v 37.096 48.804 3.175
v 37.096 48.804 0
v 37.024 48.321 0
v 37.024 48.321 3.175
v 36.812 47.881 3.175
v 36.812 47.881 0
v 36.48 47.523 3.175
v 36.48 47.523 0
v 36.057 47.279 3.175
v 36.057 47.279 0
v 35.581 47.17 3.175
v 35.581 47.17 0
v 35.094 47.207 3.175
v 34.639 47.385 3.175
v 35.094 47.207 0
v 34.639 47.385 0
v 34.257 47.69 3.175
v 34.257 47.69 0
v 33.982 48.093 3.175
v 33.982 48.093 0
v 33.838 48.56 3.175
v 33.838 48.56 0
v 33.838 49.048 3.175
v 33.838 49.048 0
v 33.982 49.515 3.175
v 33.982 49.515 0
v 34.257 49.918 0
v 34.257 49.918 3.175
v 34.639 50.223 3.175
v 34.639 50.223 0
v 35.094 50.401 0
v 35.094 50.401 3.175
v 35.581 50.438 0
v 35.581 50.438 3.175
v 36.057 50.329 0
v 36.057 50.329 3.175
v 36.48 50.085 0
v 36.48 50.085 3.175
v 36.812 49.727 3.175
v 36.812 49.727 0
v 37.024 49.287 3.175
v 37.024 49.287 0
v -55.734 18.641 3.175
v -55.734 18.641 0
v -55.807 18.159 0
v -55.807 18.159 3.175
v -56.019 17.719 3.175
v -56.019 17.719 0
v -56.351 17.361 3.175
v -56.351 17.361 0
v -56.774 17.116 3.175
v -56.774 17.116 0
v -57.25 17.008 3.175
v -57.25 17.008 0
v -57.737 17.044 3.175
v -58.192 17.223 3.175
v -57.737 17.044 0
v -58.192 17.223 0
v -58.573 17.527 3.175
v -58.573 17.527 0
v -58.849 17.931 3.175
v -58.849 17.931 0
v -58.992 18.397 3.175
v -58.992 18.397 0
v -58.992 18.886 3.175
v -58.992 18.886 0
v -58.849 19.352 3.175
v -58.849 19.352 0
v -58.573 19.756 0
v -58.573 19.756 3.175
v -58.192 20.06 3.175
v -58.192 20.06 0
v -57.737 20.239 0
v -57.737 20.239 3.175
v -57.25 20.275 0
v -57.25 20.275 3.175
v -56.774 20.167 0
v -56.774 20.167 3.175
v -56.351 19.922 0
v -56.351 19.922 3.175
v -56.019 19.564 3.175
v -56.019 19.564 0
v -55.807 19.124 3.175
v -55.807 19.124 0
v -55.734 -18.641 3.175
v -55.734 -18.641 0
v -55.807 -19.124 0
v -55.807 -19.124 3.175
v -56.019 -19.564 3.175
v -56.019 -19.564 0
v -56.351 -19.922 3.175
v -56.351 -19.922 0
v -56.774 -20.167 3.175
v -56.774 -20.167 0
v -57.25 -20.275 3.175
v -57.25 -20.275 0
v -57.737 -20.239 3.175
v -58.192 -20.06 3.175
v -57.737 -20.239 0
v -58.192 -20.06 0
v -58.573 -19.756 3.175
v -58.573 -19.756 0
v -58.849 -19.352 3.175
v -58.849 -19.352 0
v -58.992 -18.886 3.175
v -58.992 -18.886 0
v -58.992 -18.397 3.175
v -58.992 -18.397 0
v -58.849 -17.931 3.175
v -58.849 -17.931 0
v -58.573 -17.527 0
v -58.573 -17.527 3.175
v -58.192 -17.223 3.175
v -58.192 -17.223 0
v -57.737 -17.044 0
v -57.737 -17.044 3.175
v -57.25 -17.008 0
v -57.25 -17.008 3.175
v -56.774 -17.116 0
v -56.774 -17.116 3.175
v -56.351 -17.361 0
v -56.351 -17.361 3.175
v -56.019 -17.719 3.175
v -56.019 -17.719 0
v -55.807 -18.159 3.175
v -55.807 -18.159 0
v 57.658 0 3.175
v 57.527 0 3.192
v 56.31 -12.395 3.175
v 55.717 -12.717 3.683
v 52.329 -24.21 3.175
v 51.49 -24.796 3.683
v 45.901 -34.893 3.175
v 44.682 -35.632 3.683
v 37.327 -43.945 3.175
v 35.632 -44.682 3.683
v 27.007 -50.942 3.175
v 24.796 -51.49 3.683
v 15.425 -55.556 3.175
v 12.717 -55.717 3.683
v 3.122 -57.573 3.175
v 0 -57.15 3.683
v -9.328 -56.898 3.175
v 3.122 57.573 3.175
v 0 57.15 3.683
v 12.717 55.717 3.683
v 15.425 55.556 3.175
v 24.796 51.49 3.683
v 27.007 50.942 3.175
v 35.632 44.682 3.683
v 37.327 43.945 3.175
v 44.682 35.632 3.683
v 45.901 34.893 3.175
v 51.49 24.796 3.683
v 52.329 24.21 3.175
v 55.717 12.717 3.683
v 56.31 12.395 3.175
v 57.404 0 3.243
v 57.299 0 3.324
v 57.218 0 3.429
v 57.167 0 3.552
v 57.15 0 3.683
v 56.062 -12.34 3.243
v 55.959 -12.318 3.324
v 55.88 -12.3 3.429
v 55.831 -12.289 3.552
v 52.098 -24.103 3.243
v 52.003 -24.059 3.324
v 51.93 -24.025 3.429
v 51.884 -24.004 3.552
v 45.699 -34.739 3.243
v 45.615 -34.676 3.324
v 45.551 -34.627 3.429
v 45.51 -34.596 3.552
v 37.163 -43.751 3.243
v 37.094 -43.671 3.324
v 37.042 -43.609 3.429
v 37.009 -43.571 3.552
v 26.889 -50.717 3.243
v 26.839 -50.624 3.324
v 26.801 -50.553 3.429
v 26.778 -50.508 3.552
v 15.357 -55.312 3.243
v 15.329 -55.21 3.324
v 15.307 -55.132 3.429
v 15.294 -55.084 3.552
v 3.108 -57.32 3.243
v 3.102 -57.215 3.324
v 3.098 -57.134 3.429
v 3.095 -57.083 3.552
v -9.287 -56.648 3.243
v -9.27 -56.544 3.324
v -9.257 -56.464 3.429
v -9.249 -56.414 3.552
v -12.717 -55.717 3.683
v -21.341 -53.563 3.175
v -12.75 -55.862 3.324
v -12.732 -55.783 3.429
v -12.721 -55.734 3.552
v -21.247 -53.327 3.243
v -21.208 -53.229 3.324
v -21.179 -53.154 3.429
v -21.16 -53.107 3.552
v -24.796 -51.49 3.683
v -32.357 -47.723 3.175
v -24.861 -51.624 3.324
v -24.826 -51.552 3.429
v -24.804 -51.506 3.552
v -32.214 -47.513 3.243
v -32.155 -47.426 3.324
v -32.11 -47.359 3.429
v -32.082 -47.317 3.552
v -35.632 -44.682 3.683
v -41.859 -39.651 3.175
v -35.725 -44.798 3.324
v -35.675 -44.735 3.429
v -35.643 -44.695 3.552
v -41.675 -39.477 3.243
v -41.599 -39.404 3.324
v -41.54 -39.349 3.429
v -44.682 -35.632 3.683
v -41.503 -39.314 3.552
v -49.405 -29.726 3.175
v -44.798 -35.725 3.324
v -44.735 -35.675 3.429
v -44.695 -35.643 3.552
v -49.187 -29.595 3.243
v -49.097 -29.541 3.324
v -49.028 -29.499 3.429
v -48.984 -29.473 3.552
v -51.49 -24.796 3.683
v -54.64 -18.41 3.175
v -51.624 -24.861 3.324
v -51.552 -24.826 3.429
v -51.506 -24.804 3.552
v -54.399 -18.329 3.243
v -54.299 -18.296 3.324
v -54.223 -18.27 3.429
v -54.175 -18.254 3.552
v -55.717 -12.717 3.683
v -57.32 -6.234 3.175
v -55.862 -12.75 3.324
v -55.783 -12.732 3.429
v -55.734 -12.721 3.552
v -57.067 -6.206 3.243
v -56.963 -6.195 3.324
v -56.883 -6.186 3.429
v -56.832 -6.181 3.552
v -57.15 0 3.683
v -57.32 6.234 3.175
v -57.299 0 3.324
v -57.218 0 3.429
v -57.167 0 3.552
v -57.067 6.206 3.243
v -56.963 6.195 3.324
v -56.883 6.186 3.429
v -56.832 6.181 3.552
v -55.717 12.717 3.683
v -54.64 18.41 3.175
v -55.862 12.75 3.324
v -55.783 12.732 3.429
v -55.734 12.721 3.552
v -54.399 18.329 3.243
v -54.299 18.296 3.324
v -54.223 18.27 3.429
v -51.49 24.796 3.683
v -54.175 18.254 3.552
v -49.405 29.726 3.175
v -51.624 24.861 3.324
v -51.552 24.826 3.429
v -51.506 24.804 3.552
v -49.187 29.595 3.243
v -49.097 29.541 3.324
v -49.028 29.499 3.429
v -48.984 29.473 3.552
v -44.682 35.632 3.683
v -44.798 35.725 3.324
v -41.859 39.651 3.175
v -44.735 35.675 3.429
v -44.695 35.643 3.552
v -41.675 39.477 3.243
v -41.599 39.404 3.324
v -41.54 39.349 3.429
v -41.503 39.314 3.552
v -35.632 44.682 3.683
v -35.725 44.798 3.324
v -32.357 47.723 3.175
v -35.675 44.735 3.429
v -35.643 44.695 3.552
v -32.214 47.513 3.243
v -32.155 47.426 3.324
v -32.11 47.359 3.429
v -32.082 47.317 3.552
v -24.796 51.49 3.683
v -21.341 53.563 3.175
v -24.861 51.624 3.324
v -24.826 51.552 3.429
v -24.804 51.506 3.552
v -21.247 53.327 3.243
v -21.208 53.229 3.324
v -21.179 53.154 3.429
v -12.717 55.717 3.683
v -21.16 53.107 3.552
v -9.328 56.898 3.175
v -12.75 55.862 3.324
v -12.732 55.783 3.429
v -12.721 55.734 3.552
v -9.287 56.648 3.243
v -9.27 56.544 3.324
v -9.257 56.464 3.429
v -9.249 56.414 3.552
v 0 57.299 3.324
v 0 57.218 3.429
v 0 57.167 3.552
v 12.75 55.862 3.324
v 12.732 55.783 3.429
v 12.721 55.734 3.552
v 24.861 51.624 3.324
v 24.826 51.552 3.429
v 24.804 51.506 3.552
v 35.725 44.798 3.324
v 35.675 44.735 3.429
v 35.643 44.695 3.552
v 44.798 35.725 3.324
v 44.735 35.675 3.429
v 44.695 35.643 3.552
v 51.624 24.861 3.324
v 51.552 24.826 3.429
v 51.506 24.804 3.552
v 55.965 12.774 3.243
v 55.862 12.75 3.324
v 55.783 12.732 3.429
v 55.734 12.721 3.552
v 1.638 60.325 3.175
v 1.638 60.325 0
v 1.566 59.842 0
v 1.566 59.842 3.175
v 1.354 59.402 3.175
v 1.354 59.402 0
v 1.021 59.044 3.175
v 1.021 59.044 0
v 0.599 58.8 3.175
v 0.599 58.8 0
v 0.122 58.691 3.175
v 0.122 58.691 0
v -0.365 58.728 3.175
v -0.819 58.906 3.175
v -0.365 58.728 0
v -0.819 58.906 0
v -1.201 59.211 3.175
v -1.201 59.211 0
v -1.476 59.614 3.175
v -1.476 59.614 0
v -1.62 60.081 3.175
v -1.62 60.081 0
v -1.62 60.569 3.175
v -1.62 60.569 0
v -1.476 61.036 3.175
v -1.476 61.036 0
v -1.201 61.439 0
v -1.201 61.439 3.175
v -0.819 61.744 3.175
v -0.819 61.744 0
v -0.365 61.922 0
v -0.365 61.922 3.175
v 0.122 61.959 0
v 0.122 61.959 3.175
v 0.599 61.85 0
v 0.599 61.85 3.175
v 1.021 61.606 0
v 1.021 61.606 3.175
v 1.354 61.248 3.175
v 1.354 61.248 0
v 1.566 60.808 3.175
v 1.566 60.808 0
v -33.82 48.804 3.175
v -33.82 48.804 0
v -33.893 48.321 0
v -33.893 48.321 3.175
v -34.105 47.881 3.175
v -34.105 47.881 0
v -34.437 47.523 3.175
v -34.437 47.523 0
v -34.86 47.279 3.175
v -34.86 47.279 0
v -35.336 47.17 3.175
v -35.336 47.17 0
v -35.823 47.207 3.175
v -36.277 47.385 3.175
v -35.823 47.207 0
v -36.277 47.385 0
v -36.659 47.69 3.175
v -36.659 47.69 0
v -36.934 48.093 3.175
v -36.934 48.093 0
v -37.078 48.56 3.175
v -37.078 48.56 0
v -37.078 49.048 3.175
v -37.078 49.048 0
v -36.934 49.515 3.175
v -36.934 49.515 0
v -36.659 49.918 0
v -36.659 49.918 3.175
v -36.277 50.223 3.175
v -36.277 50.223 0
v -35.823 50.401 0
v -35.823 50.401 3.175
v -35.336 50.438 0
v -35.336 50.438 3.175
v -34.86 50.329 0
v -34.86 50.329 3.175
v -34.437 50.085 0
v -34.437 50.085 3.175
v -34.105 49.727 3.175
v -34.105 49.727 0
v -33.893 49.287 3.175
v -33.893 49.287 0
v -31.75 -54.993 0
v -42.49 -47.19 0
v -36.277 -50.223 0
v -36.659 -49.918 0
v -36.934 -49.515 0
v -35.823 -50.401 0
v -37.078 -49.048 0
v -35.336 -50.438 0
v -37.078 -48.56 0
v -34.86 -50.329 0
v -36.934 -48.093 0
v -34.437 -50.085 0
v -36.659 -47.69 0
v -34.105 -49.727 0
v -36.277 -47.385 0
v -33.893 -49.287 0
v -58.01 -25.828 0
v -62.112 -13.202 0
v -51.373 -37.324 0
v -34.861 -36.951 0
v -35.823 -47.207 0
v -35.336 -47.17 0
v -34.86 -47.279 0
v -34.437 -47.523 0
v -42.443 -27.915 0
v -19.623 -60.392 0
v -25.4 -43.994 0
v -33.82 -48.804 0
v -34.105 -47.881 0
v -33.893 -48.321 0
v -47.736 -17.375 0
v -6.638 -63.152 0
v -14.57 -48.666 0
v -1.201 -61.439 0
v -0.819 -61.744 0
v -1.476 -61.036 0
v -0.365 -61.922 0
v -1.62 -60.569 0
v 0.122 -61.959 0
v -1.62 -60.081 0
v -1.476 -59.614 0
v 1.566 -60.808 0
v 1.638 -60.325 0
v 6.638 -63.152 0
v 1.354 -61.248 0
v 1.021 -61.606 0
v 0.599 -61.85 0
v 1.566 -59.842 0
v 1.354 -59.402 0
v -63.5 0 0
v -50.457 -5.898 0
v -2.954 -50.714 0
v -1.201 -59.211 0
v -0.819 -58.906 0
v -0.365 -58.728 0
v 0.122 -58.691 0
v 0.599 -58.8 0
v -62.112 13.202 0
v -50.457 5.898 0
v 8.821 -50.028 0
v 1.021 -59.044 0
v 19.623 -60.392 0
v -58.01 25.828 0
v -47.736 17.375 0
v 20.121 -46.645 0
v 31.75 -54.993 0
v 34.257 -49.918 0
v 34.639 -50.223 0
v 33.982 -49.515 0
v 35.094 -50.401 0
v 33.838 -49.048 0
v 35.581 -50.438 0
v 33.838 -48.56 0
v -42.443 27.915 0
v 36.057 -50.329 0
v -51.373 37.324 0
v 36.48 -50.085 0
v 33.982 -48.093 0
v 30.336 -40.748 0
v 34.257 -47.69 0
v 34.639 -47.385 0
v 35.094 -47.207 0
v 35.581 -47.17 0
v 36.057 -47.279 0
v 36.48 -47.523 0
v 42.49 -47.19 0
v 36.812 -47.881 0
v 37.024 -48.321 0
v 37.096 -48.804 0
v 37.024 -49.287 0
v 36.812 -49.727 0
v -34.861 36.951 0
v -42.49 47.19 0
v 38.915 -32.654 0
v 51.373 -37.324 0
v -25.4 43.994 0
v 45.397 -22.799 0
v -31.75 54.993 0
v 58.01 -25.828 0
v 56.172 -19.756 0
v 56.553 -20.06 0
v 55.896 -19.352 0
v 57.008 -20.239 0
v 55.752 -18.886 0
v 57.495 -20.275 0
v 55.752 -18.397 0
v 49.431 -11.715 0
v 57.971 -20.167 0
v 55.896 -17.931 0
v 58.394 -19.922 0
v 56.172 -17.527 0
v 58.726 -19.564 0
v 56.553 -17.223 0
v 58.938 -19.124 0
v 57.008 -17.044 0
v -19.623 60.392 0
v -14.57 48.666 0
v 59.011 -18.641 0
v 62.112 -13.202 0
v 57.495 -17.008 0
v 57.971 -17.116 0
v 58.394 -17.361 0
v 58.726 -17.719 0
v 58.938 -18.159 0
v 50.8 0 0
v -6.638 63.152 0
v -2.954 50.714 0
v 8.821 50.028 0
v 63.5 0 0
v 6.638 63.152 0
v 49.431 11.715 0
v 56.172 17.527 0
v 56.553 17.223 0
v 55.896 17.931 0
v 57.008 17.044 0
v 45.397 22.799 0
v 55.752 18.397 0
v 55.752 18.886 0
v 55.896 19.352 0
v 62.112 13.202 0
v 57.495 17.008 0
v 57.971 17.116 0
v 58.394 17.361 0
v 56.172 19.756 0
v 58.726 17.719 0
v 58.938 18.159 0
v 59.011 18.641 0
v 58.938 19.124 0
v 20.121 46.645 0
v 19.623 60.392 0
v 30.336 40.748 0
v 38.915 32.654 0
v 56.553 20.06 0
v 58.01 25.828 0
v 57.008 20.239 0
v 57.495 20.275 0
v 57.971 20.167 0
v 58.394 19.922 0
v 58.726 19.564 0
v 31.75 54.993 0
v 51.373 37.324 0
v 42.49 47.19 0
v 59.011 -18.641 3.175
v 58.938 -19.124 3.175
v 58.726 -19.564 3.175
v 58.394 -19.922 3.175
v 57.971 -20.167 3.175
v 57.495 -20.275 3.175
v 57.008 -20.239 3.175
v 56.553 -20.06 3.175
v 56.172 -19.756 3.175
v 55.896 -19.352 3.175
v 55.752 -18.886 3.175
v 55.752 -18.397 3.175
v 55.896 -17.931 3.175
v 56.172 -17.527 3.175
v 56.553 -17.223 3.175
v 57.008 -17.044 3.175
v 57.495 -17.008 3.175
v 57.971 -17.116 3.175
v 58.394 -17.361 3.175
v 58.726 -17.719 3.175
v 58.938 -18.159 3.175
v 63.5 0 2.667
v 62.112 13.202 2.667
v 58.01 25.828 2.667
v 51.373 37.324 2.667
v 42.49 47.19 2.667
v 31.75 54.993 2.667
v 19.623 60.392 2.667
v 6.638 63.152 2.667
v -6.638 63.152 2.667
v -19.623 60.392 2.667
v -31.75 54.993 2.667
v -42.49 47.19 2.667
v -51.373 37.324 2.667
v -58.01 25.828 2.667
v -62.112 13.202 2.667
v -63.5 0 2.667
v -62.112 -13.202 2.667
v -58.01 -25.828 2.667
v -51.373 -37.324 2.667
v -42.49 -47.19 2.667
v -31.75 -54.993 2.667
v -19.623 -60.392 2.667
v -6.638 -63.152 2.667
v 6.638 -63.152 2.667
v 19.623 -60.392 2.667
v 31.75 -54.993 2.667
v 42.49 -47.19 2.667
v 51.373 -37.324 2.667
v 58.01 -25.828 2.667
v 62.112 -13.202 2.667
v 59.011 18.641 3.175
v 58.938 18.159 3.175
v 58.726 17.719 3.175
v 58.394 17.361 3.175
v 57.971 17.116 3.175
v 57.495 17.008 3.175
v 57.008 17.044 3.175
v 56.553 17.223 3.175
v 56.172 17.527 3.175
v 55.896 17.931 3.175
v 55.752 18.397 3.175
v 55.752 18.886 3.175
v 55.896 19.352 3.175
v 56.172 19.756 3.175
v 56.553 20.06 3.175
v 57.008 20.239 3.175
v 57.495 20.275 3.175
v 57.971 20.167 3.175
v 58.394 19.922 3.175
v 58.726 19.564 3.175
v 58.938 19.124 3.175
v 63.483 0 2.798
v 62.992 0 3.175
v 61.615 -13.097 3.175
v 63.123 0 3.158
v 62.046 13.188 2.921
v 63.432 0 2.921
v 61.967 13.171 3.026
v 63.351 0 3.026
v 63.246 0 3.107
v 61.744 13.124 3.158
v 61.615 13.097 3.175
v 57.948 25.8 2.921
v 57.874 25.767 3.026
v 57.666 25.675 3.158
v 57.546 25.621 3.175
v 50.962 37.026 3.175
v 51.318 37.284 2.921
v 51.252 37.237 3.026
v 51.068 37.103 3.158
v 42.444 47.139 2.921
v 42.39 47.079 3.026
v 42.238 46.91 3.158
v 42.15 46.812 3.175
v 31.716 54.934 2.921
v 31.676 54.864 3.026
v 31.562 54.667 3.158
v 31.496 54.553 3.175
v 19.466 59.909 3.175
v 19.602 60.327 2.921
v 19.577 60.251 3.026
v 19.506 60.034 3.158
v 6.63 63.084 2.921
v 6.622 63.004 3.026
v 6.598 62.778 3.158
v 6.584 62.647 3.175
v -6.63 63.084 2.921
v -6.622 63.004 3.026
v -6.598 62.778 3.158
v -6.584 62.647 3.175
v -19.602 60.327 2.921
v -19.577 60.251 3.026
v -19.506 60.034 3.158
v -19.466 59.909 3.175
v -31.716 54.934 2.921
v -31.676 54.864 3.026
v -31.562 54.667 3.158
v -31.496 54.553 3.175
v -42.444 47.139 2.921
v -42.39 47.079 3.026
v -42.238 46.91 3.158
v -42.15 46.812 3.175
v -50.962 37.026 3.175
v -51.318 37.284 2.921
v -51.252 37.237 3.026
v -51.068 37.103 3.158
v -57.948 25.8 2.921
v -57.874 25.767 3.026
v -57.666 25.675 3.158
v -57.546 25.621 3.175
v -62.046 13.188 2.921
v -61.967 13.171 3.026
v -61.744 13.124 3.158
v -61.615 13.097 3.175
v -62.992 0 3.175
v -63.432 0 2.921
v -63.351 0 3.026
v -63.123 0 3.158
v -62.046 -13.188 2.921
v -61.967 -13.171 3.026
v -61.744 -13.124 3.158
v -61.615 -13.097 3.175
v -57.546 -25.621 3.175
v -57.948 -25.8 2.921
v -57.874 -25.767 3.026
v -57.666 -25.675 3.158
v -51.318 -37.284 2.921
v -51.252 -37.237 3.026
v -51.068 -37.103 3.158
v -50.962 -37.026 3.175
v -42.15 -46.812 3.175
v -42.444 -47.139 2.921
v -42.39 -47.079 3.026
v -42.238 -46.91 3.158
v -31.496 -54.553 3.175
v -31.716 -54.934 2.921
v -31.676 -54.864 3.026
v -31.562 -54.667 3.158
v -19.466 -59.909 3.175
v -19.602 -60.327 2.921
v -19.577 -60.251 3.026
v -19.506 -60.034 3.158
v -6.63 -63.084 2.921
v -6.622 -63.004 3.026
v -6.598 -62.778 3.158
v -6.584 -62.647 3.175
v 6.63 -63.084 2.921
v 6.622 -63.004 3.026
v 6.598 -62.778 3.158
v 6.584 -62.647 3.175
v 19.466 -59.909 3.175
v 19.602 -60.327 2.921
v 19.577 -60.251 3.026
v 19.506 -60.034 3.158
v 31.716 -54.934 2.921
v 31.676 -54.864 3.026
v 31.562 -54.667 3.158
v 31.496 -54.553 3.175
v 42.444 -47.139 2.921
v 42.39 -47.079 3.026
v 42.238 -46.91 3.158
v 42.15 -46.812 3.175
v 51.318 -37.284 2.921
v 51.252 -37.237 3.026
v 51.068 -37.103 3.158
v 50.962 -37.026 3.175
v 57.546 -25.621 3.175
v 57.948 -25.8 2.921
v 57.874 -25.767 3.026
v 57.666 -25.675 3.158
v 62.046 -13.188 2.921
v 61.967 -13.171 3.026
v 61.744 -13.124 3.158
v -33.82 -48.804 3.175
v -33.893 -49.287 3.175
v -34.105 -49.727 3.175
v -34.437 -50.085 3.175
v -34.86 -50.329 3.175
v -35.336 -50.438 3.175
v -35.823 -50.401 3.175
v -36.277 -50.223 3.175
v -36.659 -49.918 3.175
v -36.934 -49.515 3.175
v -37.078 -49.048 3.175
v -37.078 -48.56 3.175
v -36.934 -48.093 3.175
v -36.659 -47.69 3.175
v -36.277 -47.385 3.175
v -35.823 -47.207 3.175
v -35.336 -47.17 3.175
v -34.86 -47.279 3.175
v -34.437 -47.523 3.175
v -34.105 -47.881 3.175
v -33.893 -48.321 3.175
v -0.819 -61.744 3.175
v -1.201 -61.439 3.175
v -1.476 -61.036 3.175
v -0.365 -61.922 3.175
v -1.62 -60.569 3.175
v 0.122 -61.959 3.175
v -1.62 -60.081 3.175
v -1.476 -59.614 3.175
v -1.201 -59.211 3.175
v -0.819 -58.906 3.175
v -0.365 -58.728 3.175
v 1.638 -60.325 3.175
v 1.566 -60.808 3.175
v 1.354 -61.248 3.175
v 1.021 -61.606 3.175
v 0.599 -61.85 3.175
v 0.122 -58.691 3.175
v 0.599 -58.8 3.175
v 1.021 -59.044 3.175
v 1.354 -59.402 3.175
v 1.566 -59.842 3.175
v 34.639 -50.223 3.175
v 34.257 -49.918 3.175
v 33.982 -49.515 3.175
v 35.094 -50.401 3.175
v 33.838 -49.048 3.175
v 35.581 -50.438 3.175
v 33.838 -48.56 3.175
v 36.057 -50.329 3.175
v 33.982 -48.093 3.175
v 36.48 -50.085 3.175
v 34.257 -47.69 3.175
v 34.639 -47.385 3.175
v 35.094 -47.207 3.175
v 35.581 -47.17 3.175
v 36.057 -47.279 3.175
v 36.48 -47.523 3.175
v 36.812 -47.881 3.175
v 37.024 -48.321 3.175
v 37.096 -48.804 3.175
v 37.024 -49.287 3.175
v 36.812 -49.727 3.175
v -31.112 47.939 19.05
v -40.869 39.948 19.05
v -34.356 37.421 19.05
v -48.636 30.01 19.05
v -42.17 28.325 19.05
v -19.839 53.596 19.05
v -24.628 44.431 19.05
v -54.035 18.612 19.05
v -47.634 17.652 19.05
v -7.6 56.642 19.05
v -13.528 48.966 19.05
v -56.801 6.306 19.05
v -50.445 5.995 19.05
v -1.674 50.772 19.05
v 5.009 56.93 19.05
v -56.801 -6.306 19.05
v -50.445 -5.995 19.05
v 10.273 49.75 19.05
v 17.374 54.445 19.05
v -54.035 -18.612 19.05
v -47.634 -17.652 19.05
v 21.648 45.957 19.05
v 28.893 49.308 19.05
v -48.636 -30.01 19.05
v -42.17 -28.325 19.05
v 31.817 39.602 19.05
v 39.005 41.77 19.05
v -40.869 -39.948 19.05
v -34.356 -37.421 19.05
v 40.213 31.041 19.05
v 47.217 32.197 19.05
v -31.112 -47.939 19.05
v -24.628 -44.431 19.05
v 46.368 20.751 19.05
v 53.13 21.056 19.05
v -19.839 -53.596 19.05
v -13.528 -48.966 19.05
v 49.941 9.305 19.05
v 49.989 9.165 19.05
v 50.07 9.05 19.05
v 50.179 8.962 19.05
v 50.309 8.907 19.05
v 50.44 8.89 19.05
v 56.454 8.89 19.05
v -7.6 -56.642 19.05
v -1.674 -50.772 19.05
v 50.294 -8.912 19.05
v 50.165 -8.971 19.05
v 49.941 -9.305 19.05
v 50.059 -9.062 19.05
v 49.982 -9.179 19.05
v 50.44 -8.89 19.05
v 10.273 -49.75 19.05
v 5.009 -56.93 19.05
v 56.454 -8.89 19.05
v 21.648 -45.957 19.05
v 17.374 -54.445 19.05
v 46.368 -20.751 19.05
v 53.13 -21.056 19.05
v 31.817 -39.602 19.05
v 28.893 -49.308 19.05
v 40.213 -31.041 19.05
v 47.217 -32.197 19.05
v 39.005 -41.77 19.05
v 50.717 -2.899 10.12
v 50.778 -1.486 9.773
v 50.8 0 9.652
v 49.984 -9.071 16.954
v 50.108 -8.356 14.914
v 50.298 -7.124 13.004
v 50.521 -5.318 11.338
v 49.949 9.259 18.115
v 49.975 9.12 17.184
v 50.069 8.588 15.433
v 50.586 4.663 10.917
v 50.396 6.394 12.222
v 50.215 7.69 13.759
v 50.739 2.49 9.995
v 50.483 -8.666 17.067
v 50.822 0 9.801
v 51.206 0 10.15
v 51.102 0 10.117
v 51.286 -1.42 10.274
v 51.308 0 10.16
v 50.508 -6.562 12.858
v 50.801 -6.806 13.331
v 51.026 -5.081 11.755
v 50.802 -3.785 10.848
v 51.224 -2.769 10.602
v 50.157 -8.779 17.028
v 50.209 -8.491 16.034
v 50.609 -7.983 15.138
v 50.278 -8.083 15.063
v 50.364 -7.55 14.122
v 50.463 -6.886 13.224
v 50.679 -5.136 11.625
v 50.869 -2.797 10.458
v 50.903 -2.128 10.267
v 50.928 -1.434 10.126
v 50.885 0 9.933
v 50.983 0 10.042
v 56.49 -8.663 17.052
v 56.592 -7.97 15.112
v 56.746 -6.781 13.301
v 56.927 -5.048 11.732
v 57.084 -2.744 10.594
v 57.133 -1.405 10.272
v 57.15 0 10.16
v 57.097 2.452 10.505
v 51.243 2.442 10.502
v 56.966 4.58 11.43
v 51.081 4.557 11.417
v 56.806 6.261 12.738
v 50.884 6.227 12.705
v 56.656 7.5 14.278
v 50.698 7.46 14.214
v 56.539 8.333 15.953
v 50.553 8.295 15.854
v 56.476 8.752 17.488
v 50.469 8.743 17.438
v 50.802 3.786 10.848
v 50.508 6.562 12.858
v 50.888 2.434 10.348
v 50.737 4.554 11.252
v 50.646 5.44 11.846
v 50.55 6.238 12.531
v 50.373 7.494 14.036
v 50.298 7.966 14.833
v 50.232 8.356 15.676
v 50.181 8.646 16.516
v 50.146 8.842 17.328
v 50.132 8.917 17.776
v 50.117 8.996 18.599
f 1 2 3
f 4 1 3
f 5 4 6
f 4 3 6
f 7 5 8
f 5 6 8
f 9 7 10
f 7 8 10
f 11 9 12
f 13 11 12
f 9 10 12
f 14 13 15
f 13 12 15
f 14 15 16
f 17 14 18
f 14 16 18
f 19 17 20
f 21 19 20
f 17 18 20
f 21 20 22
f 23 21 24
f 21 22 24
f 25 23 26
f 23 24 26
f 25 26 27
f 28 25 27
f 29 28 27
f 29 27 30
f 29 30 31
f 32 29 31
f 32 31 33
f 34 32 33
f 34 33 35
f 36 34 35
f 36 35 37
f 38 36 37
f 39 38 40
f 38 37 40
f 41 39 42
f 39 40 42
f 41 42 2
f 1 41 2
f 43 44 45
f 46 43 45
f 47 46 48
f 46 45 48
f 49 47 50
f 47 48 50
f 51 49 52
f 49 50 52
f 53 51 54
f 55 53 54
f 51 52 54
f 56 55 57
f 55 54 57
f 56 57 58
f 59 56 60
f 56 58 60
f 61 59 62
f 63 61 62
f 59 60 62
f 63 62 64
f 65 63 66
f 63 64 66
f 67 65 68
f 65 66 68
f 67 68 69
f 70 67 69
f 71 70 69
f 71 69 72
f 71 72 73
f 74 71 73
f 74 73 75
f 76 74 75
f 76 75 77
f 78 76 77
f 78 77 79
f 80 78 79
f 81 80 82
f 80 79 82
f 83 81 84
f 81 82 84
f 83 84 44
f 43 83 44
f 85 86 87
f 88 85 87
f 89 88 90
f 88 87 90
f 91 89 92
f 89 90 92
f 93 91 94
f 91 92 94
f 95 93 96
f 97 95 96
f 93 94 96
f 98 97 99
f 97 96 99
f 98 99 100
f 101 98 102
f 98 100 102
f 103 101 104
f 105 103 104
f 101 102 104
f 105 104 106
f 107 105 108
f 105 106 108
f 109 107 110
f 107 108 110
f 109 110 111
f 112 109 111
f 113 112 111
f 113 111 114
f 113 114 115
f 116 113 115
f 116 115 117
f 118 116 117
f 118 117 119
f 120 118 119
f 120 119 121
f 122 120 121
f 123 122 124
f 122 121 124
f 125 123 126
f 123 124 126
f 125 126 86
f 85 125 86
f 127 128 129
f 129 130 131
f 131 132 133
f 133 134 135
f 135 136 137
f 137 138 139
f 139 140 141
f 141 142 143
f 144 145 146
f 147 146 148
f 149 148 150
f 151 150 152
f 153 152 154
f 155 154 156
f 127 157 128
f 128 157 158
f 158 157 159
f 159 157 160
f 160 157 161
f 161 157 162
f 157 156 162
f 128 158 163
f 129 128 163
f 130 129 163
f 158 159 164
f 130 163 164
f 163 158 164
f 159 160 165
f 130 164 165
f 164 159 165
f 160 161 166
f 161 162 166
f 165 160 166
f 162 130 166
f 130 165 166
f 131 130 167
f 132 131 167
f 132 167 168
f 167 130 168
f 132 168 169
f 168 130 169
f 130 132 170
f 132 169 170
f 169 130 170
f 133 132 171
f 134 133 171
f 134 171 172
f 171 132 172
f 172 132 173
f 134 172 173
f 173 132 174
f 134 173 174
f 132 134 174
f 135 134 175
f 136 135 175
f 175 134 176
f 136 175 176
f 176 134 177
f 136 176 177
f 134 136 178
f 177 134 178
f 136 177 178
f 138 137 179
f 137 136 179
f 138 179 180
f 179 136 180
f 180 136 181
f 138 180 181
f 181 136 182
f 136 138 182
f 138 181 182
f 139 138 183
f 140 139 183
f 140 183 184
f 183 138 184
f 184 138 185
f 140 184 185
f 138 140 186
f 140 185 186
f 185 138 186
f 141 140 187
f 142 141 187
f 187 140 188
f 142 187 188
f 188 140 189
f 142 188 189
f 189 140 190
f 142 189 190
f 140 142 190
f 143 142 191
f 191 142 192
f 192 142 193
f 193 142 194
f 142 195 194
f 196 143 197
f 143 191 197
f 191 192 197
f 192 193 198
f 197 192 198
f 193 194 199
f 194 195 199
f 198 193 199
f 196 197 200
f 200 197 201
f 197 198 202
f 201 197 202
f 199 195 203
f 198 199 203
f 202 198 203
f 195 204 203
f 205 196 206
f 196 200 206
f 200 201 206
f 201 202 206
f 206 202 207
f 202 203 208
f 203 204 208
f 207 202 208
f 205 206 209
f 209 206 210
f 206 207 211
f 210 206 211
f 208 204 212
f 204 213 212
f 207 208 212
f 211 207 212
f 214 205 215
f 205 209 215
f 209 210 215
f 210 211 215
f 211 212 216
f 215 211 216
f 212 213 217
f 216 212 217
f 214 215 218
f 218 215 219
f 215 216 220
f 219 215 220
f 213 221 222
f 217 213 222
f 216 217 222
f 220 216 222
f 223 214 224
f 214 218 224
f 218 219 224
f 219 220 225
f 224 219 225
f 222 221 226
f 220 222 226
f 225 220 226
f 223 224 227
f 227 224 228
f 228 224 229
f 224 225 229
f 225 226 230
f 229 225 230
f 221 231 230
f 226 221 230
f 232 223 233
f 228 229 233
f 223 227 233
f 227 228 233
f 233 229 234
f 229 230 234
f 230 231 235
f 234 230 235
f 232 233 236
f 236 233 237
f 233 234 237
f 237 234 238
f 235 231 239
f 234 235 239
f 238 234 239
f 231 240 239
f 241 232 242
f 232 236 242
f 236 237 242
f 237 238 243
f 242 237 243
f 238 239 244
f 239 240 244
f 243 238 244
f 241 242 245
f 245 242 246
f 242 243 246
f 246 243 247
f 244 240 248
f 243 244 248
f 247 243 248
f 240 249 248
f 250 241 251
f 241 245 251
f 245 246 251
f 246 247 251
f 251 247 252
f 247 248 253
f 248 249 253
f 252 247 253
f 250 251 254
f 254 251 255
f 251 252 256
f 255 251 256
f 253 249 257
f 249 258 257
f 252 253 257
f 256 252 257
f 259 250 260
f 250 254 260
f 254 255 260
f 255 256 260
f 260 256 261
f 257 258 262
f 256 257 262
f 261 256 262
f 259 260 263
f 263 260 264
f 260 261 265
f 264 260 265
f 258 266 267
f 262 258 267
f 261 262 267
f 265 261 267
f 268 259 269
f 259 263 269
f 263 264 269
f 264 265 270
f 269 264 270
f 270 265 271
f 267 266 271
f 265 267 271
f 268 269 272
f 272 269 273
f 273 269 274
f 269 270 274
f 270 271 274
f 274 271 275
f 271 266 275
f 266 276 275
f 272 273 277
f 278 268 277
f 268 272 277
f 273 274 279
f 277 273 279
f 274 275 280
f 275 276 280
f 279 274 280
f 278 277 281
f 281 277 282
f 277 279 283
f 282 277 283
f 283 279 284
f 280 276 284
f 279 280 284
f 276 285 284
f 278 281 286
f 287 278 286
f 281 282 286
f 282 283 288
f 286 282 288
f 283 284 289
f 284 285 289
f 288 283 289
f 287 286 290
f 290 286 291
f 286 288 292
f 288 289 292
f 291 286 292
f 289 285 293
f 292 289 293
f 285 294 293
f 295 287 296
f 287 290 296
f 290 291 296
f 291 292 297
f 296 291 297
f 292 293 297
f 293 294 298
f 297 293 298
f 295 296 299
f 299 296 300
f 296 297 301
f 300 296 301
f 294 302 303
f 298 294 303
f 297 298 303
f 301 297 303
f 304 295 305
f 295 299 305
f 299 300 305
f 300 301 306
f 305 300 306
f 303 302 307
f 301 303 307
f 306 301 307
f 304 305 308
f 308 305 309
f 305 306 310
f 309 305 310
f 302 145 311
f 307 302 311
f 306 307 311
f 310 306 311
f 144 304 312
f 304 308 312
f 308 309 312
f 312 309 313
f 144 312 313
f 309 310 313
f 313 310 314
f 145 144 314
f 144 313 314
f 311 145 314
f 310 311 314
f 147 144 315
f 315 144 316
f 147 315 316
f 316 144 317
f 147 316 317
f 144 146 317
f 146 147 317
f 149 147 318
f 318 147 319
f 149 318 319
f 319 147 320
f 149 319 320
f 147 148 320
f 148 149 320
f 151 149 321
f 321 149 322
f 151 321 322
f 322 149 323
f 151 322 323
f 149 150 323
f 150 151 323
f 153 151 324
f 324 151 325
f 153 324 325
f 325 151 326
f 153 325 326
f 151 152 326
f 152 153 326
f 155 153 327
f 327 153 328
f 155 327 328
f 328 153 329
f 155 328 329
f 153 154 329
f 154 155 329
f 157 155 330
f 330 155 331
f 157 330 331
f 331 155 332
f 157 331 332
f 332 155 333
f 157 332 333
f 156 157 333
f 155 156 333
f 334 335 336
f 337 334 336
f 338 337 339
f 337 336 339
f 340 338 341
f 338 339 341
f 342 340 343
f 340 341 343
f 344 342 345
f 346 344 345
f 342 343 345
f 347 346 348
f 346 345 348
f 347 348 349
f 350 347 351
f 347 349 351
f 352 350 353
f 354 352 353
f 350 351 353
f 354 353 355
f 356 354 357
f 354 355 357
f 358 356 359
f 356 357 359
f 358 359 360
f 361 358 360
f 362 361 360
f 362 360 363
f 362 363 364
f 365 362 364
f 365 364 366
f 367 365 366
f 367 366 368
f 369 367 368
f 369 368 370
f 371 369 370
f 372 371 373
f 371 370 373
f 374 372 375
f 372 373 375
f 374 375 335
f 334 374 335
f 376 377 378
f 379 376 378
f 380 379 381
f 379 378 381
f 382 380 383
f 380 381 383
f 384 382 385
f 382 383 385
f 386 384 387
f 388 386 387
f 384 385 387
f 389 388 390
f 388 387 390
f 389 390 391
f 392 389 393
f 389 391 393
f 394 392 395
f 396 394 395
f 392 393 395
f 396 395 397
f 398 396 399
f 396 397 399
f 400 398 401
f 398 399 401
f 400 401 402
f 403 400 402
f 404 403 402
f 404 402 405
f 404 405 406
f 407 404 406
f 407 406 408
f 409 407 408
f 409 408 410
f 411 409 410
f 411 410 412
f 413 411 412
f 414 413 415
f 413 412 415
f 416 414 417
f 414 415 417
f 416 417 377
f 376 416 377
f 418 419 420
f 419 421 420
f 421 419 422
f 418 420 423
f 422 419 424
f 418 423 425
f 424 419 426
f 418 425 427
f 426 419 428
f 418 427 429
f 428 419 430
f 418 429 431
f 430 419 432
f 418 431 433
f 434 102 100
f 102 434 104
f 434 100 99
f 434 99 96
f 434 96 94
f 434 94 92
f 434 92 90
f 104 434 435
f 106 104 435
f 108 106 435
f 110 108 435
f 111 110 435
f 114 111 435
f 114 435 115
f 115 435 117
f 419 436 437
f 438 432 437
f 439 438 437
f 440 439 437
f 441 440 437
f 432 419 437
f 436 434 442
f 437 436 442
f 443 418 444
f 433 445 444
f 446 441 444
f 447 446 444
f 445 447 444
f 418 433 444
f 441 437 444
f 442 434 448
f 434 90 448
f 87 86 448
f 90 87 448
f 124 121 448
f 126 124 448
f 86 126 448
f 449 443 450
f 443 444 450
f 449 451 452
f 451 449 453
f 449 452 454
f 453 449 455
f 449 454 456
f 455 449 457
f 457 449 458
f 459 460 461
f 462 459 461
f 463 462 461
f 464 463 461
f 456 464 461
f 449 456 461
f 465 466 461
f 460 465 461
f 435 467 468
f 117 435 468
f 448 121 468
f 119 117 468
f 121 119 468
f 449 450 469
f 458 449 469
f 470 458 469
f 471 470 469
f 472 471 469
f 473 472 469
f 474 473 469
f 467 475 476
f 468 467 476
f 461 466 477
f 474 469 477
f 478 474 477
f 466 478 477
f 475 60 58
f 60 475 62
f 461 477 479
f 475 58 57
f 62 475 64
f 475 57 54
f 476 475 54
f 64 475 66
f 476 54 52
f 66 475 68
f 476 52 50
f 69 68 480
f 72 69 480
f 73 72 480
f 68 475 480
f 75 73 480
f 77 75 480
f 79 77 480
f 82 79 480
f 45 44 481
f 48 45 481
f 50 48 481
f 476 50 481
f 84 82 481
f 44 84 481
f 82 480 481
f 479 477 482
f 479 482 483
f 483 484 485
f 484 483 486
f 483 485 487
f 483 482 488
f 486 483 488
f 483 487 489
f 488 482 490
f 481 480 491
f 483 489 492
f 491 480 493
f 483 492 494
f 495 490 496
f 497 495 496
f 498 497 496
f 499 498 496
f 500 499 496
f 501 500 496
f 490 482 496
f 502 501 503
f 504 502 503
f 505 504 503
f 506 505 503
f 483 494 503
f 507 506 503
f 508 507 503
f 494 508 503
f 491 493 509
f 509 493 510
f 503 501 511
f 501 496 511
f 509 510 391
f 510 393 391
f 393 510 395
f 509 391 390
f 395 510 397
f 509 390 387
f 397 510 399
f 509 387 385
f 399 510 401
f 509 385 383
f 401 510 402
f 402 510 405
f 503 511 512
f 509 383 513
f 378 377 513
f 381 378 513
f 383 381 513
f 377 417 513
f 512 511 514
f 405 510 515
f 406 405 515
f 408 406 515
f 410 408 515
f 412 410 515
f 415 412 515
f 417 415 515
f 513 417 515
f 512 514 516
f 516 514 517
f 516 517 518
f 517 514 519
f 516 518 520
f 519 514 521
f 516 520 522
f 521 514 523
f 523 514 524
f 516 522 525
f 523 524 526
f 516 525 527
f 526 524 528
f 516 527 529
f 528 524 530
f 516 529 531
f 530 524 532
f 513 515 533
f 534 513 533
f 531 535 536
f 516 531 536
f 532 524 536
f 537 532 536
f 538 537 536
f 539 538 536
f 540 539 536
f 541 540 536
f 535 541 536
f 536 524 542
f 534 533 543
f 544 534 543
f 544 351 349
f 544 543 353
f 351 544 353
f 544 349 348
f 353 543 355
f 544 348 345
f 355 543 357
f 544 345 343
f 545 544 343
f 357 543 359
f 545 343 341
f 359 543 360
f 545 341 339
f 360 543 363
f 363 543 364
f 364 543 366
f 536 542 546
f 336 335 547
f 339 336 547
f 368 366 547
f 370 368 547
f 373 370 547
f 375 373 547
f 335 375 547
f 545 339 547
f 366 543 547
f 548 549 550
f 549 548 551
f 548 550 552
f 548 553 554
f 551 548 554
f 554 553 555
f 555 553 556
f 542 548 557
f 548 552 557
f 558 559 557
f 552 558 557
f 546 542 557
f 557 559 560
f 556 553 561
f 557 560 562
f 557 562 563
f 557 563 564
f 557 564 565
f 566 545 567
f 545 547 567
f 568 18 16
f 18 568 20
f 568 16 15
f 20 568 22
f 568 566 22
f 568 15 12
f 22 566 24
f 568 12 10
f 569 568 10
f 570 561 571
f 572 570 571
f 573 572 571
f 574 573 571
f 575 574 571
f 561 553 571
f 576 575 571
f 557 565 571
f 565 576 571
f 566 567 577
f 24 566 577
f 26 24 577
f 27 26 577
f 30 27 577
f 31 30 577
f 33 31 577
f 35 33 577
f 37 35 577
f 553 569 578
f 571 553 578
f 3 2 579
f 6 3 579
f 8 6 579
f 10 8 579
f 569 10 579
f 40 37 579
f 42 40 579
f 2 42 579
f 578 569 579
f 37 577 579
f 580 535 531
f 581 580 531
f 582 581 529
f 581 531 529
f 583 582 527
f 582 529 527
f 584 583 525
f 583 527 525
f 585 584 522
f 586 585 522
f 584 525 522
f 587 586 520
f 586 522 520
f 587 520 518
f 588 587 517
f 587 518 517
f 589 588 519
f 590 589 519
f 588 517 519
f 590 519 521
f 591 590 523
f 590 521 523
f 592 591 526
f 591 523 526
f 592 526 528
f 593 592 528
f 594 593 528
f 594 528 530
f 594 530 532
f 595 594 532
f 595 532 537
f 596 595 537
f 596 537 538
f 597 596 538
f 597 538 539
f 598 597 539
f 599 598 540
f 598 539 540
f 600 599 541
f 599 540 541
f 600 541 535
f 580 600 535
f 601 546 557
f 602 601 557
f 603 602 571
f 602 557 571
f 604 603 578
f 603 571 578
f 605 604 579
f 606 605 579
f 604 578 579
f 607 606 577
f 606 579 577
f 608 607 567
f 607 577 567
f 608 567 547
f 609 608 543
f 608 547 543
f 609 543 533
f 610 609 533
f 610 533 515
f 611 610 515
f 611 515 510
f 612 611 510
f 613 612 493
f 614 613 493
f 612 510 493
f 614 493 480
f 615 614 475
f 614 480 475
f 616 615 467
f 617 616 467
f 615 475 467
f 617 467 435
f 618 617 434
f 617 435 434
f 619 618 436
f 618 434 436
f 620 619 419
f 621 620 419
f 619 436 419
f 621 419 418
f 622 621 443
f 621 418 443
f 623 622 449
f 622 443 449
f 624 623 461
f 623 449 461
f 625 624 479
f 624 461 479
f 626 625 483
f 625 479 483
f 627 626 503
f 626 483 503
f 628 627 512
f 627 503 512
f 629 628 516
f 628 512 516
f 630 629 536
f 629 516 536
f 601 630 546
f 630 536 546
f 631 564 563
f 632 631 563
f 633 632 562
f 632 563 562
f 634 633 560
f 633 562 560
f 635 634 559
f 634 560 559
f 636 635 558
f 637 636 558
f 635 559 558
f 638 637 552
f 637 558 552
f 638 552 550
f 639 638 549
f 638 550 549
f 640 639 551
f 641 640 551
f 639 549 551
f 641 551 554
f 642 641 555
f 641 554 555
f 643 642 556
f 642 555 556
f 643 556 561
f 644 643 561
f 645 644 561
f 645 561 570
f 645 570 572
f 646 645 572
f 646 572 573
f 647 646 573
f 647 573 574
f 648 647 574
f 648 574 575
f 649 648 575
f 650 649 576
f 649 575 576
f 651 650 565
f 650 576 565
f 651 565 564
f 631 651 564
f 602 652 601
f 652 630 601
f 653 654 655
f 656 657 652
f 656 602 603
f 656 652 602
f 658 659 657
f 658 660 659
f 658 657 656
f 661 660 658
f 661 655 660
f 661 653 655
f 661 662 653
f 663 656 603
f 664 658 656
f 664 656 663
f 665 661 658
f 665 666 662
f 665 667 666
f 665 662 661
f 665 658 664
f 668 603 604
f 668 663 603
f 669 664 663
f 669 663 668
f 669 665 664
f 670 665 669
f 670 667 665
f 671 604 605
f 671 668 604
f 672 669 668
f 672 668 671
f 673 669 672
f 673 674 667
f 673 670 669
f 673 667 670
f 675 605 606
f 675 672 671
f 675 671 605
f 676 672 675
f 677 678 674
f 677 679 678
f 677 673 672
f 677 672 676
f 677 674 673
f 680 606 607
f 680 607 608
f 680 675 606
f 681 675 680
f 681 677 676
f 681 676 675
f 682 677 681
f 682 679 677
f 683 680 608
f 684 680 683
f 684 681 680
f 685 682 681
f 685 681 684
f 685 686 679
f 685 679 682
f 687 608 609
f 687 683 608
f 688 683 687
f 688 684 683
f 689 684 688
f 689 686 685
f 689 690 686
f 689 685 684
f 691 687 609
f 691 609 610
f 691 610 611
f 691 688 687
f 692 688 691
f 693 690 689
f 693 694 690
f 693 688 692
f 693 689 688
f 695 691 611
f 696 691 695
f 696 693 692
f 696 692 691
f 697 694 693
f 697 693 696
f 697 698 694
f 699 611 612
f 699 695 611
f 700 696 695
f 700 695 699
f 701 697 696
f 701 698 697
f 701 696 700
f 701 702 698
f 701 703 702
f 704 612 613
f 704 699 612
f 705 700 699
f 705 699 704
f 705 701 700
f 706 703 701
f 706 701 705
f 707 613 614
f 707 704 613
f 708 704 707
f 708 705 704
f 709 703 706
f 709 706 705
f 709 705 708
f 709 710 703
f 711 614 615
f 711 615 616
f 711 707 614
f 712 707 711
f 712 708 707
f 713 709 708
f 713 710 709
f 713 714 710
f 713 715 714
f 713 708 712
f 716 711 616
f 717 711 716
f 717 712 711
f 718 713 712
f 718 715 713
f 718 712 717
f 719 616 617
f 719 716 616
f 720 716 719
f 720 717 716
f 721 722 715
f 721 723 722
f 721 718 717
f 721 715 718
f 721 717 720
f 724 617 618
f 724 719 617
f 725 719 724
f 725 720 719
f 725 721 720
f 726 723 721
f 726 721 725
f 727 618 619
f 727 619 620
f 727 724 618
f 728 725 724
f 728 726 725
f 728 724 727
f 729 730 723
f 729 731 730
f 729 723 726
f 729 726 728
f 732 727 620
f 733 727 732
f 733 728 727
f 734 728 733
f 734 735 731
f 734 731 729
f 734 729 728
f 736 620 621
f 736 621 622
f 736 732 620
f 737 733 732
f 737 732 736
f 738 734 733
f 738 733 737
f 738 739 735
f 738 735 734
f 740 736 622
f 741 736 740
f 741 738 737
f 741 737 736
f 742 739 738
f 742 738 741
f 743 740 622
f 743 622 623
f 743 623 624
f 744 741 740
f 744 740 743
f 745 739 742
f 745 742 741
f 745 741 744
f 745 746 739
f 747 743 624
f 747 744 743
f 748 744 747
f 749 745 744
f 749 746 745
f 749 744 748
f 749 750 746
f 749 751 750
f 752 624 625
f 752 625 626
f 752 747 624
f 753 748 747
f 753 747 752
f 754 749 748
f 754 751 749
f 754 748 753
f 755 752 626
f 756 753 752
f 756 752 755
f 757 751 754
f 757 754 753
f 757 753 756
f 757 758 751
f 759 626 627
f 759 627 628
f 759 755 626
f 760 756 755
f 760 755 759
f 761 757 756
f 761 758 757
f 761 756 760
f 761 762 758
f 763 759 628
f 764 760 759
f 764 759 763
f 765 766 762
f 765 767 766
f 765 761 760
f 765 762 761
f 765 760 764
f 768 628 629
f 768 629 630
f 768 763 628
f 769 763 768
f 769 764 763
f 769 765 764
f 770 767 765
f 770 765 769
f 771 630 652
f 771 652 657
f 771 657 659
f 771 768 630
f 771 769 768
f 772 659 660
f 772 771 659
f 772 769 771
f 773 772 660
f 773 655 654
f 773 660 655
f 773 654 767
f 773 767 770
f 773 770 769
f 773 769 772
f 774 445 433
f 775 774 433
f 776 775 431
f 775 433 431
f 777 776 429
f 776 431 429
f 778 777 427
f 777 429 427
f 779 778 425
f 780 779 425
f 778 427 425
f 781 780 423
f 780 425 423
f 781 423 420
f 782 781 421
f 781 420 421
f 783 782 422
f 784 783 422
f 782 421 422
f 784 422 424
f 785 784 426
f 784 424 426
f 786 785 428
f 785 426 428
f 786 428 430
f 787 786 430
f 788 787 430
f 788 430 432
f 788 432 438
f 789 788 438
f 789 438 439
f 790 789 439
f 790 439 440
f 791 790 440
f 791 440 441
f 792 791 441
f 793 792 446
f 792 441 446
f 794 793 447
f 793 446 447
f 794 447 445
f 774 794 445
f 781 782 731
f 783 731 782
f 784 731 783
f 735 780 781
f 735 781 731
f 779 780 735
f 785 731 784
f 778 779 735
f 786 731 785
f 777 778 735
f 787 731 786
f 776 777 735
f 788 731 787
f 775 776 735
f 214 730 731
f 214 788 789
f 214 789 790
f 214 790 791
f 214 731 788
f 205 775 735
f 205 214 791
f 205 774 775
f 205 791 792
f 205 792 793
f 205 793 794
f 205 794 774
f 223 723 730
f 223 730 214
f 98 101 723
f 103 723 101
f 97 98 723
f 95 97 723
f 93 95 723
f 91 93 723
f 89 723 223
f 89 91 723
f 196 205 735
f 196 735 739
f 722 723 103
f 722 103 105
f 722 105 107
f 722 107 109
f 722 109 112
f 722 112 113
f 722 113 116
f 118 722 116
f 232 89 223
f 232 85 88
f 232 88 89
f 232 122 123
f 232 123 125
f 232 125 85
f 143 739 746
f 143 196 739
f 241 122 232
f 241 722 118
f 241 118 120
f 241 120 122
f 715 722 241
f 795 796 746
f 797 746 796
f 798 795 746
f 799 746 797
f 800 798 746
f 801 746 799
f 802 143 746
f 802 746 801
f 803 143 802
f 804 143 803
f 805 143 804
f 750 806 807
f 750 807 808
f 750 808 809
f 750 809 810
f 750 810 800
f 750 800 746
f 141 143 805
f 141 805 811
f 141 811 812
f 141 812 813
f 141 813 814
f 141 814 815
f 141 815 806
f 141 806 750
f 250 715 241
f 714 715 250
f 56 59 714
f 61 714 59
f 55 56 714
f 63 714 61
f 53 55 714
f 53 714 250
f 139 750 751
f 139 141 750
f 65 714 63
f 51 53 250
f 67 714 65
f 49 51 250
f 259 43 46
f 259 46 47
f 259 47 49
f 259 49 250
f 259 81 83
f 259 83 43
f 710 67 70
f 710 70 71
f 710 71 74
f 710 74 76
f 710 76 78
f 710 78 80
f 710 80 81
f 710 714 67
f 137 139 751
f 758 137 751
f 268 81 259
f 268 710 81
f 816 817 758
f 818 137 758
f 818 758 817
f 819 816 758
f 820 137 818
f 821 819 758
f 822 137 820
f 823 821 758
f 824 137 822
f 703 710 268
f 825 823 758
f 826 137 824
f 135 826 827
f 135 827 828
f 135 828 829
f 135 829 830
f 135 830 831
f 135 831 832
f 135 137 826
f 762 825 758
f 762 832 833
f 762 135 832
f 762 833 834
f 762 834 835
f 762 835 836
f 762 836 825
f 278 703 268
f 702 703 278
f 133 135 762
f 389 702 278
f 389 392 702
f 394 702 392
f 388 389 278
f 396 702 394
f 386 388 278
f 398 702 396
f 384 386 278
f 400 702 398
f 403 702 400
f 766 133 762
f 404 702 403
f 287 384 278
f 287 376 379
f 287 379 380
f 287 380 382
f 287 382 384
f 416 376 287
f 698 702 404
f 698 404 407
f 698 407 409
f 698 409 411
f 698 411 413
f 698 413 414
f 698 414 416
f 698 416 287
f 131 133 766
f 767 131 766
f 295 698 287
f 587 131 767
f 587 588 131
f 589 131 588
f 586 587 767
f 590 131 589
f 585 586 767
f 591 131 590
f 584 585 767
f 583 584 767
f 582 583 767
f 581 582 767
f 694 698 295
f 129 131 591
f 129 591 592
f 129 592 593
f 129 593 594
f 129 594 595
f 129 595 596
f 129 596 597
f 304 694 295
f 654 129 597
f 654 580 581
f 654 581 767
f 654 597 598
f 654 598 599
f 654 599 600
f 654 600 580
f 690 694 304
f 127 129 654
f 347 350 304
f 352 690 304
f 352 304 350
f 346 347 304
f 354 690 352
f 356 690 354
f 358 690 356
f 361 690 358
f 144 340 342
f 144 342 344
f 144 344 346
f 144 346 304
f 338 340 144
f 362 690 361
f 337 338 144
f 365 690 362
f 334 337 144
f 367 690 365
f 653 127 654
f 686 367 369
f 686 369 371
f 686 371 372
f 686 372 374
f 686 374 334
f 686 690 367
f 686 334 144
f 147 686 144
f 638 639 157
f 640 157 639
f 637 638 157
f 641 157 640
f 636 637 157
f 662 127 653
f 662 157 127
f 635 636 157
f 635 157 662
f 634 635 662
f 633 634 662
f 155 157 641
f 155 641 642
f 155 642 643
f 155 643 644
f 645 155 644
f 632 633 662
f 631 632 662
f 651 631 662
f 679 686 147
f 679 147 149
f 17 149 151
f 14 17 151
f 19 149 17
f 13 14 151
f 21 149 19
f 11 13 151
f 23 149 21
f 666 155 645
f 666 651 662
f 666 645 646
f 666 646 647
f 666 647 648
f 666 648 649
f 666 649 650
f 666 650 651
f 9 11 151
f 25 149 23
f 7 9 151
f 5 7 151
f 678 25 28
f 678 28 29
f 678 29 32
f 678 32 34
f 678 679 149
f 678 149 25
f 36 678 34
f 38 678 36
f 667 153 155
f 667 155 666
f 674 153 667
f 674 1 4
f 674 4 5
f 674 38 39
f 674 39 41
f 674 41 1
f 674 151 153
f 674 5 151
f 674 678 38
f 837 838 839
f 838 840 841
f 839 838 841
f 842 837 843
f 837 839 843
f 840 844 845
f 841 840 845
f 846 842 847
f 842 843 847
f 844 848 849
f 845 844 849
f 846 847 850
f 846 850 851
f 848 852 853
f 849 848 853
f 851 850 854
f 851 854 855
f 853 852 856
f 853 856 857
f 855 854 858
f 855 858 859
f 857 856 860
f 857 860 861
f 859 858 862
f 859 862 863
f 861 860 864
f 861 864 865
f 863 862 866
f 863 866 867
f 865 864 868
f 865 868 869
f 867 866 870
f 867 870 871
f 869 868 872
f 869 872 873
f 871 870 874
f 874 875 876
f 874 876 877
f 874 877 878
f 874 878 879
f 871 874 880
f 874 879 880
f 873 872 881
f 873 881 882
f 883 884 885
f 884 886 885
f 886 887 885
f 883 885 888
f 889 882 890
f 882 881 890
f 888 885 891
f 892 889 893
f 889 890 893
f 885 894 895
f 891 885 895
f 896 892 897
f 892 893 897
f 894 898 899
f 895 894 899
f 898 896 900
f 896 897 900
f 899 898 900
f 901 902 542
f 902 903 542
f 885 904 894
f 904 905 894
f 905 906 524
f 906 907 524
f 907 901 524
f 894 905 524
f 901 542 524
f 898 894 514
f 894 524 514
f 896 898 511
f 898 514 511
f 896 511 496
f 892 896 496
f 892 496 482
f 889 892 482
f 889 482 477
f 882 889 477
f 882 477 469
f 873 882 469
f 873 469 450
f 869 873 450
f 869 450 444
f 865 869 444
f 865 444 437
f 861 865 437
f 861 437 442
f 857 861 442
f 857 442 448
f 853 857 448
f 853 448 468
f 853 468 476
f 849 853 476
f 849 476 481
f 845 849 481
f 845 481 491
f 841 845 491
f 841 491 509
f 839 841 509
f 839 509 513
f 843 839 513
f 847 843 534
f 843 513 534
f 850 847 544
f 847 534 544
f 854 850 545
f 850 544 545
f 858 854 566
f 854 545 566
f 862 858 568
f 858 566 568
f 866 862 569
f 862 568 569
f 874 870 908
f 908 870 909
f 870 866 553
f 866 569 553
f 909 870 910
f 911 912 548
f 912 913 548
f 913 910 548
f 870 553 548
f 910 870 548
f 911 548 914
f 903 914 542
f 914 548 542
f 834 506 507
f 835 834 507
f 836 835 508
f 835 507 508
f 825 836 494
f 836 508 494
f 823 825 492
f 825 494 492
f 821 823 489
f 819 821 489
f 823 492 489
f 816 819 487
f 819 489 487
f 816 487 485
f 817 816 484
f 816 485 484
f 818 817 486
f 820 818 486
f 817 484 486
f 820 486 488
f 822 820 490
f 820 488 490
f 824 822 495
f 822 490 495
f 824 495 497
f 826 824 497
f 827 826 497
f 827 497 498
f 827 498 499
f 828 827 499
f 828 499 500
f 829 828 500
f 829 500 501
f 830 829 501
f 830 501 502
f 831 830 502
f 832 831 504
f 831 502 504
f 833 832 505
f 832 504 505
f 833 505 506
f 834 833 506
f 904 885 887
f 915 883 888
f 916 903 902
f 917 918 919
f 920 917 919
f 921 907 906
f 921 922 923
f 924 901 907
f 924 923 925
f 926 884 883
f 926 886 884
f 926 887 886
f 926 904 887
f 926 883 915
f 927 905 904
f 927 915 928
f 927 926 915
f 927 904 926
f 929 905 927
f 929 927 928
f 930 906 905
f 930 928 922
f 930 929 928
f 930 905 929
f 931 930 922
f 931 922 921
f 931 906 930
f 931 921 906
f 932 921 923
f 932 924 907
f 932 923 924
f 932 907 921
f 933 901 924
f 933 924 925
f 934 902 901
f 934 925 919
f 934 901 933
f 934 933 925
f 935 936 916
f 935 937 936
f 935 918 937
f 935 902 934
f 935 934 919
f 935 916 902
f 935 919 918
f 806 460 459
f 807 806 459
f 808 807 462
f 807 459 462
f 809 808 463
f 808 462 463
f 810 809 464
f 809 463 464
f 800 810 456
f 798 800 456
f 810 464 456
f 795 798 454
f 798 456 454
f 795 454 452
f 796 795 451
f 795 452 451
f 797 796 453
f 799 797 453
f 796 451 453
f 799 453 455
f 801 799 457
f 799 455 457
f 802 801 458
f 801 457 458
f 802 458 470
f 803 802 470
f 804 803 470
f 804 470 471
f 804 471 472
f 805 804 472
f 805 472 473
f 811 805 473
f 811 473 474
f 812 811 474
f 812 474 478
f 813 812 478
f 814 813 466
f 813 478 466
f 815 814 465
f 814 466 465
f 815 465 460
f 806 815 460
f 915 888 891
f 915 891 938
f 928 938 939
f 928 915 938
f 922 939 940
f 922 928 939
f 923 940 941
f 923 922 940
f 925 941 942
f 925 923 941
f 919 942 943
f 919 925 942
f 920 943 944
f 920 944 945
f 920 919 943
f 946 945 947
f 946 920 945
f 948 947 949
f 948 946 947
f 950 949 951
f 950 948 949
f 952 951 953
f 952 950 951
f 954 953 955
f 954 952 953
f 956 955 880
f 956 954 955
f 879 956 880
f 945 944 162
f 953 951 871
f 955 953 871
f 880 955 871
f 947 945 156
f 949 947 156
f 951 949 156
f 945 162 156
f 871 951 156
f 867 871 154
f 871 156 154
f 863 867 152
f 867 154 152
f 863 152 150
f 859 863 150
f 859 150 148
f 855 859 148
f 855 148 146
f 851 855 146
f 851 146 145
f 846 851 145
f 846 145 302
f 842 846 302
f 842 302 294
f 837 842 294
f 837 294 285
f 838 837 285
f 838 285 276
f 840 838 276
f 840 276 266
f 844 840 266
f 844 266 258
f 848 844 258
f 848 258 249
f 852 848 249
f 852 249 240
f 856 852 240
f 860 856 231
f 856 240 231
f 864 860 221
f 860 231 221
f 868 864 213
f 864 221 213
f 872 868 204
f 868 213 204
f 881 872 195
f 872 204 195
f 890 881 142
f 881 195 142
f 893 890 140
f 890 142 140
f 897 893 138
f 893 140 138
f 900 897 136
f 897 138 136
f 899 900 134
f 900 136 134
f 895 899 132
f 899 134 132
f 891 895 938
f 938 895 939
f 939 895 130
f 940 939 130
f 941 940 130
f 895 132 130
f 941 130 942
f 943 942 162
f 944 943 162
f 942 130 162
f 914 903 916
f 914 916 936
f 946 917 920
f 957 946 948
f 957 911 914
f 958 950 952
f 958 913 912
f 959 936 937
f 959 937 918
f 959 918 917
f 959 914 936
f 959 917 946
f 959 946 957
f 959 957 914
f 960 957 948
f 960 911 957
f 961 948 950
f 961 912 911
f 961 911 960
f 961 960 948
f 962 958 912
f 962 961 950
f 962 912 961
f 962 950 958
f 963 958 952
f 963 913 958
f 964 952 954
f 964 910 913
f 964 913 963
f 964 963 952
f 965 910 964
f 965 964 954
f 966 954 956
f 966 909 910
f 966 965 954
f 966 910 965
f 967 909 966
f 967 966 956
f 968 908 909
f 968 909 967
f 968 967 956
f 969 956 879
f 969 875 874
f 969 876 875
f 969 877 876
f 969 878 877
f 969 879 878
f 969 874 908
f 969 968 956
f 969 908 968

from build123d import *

# Parameters (mm, degrees)
F0_R      = 63.5
F1_DEPTH  = 3.175
F2_R      = 57.15
F3_DEPTH  = 58.7375
F4_R      = 50.8
F5_DEPTH  = 50.8
F6_R      = 1.6383
F7_DEPTH  = 3.175
F8_R      = 1.1303
F9_DEPTH  = 5.55625
F10_R     = 8.89
F11_REACH = 88.645717139
F12_R     = 0.508
F13_W     = 139.7
F13_H     = 50.8
F14_DEPTH = 63.5


with BuildPart() as f1:
    # F0 (on Top) → F1 (new body)
    with BuildSketch(Plane.XY):
        Circle(F0_R)
    extrude(amount=F1_DEPTH)

    # F2 (on Top) → F3 (join)
    with BuildSketch(Plane.XY):
        Circle(F2_R)
    extrude(amount=F3_DEPTH)

    # F4 (on face) → F5 (cut)
    with BuildSketch(Plane(origin=(0, 0, 0), x_dir=(1, 0, 0), z_dir=(0, 0, -1))):
        Circle(F4_R)
    extrude(amount=-F5_DEPTH, mode=Mode.SUBTRACT)

    # F6 (on face) → F7 (cut, through all)
    with BuildSketch(Plane(origin=(0, 0, 0), x_dir=(1, 0, 0), z_dir=(0, 0, -1))):
        with Locations((0, -60.325)):
            Circle(F6_R)
        with Locations((35.4581453445, -48.8039501857)):
            Circle(F6_R)
        with Locations((57.3724843455, -18.6414501857)):
            Circle(F6_R)
        with Locations((57.3724843455, 18.6414501857)):
            Circle(F6_R)
        with Locations((35.4581453445, 48.8039501857)):
            Circle(F6_R)
        with Locations((0, 60.325)):
            Circle(F6_R)
        with Locations((-35.4581453445, 48.8039501857)):
            Circle(F6_R)
        with Locations((-57.3724843455, 18.6414501857)):
            Circle(F6_R)
        with Locations((-57.3724843455, -18.6414501857)):
            Circle(F6_R)
        with Locations((-35.4581453445, -48.8039501857)):
            Circle(F6_R)
    extrude(amount=-F7_DEPTH, mode=Mode.SUBTRACT)

    # F8 (on face) → F9 (cut)
    with BuildSketch(Plane(origin=(0, 0, 50.8), x_dir=(1, 0, 0), z_dir=(0, 0, -1))):
        with Locations((31.115, -31.115)):
            Circle(F8_R)
        with Locations((-31.115, -31.115)):
            Circle(F8_R)
        with Locations((-31.115, 31.115)):
            Circle(F8_R)
        with Locations((31.115, 31.115)):
            Circle(F8_R)
        with Locations((31.115, 0)):
            Circle(F8_R)
        with Locations((-31.115, 0)):
            Circle(F8_R)
    extrude(amount=-F9_DEPTH, mode=Mode.SUBTRACT)

    f11_end = f1.faces().sort_by_distance((-57.15, 0, 30.95625))[0]
    # F10 (on Right) → F11 (cut, up to a face of the model that its end follows)
    with BuildSketch(Plane.YZ):
        with Locations((0, 19.05)):
            Circle(F10_R)
    f11_long = extrude(amount=F11_REACH, mode=Mode.PRIVATE)
    add(split(f11_long, bisect_by=f11_end, keep=Keep.BOTTOM, mode=Mode.PRIVATE), mode=Mode.SUBTRACT)

    # F12
    f12_edges = [f1.edges().sort_by_distance(p)[0] for p in [
        (-57.15, 0, 58.7375),
        (-63.5, 0, 3.175),
        (-57.15, 0, 3.175),
        (50.345599, 6.779427, 13.29922),
        (50.016076, -8.89, 19.051457),
    ]]
    fillet(f12_edges, radius=F12_R)

    # F13 (on Front) → F14 (cut, symmetric)
    with BuildSketch(Plane.XZ):
        with Locations((0, 44.45)):
            Rectangle(F13_W, F13_H)
    extrude(amount=F14_DEPTH, both=True, mode=Mode.SUBTRACT)


solid = f1.part
